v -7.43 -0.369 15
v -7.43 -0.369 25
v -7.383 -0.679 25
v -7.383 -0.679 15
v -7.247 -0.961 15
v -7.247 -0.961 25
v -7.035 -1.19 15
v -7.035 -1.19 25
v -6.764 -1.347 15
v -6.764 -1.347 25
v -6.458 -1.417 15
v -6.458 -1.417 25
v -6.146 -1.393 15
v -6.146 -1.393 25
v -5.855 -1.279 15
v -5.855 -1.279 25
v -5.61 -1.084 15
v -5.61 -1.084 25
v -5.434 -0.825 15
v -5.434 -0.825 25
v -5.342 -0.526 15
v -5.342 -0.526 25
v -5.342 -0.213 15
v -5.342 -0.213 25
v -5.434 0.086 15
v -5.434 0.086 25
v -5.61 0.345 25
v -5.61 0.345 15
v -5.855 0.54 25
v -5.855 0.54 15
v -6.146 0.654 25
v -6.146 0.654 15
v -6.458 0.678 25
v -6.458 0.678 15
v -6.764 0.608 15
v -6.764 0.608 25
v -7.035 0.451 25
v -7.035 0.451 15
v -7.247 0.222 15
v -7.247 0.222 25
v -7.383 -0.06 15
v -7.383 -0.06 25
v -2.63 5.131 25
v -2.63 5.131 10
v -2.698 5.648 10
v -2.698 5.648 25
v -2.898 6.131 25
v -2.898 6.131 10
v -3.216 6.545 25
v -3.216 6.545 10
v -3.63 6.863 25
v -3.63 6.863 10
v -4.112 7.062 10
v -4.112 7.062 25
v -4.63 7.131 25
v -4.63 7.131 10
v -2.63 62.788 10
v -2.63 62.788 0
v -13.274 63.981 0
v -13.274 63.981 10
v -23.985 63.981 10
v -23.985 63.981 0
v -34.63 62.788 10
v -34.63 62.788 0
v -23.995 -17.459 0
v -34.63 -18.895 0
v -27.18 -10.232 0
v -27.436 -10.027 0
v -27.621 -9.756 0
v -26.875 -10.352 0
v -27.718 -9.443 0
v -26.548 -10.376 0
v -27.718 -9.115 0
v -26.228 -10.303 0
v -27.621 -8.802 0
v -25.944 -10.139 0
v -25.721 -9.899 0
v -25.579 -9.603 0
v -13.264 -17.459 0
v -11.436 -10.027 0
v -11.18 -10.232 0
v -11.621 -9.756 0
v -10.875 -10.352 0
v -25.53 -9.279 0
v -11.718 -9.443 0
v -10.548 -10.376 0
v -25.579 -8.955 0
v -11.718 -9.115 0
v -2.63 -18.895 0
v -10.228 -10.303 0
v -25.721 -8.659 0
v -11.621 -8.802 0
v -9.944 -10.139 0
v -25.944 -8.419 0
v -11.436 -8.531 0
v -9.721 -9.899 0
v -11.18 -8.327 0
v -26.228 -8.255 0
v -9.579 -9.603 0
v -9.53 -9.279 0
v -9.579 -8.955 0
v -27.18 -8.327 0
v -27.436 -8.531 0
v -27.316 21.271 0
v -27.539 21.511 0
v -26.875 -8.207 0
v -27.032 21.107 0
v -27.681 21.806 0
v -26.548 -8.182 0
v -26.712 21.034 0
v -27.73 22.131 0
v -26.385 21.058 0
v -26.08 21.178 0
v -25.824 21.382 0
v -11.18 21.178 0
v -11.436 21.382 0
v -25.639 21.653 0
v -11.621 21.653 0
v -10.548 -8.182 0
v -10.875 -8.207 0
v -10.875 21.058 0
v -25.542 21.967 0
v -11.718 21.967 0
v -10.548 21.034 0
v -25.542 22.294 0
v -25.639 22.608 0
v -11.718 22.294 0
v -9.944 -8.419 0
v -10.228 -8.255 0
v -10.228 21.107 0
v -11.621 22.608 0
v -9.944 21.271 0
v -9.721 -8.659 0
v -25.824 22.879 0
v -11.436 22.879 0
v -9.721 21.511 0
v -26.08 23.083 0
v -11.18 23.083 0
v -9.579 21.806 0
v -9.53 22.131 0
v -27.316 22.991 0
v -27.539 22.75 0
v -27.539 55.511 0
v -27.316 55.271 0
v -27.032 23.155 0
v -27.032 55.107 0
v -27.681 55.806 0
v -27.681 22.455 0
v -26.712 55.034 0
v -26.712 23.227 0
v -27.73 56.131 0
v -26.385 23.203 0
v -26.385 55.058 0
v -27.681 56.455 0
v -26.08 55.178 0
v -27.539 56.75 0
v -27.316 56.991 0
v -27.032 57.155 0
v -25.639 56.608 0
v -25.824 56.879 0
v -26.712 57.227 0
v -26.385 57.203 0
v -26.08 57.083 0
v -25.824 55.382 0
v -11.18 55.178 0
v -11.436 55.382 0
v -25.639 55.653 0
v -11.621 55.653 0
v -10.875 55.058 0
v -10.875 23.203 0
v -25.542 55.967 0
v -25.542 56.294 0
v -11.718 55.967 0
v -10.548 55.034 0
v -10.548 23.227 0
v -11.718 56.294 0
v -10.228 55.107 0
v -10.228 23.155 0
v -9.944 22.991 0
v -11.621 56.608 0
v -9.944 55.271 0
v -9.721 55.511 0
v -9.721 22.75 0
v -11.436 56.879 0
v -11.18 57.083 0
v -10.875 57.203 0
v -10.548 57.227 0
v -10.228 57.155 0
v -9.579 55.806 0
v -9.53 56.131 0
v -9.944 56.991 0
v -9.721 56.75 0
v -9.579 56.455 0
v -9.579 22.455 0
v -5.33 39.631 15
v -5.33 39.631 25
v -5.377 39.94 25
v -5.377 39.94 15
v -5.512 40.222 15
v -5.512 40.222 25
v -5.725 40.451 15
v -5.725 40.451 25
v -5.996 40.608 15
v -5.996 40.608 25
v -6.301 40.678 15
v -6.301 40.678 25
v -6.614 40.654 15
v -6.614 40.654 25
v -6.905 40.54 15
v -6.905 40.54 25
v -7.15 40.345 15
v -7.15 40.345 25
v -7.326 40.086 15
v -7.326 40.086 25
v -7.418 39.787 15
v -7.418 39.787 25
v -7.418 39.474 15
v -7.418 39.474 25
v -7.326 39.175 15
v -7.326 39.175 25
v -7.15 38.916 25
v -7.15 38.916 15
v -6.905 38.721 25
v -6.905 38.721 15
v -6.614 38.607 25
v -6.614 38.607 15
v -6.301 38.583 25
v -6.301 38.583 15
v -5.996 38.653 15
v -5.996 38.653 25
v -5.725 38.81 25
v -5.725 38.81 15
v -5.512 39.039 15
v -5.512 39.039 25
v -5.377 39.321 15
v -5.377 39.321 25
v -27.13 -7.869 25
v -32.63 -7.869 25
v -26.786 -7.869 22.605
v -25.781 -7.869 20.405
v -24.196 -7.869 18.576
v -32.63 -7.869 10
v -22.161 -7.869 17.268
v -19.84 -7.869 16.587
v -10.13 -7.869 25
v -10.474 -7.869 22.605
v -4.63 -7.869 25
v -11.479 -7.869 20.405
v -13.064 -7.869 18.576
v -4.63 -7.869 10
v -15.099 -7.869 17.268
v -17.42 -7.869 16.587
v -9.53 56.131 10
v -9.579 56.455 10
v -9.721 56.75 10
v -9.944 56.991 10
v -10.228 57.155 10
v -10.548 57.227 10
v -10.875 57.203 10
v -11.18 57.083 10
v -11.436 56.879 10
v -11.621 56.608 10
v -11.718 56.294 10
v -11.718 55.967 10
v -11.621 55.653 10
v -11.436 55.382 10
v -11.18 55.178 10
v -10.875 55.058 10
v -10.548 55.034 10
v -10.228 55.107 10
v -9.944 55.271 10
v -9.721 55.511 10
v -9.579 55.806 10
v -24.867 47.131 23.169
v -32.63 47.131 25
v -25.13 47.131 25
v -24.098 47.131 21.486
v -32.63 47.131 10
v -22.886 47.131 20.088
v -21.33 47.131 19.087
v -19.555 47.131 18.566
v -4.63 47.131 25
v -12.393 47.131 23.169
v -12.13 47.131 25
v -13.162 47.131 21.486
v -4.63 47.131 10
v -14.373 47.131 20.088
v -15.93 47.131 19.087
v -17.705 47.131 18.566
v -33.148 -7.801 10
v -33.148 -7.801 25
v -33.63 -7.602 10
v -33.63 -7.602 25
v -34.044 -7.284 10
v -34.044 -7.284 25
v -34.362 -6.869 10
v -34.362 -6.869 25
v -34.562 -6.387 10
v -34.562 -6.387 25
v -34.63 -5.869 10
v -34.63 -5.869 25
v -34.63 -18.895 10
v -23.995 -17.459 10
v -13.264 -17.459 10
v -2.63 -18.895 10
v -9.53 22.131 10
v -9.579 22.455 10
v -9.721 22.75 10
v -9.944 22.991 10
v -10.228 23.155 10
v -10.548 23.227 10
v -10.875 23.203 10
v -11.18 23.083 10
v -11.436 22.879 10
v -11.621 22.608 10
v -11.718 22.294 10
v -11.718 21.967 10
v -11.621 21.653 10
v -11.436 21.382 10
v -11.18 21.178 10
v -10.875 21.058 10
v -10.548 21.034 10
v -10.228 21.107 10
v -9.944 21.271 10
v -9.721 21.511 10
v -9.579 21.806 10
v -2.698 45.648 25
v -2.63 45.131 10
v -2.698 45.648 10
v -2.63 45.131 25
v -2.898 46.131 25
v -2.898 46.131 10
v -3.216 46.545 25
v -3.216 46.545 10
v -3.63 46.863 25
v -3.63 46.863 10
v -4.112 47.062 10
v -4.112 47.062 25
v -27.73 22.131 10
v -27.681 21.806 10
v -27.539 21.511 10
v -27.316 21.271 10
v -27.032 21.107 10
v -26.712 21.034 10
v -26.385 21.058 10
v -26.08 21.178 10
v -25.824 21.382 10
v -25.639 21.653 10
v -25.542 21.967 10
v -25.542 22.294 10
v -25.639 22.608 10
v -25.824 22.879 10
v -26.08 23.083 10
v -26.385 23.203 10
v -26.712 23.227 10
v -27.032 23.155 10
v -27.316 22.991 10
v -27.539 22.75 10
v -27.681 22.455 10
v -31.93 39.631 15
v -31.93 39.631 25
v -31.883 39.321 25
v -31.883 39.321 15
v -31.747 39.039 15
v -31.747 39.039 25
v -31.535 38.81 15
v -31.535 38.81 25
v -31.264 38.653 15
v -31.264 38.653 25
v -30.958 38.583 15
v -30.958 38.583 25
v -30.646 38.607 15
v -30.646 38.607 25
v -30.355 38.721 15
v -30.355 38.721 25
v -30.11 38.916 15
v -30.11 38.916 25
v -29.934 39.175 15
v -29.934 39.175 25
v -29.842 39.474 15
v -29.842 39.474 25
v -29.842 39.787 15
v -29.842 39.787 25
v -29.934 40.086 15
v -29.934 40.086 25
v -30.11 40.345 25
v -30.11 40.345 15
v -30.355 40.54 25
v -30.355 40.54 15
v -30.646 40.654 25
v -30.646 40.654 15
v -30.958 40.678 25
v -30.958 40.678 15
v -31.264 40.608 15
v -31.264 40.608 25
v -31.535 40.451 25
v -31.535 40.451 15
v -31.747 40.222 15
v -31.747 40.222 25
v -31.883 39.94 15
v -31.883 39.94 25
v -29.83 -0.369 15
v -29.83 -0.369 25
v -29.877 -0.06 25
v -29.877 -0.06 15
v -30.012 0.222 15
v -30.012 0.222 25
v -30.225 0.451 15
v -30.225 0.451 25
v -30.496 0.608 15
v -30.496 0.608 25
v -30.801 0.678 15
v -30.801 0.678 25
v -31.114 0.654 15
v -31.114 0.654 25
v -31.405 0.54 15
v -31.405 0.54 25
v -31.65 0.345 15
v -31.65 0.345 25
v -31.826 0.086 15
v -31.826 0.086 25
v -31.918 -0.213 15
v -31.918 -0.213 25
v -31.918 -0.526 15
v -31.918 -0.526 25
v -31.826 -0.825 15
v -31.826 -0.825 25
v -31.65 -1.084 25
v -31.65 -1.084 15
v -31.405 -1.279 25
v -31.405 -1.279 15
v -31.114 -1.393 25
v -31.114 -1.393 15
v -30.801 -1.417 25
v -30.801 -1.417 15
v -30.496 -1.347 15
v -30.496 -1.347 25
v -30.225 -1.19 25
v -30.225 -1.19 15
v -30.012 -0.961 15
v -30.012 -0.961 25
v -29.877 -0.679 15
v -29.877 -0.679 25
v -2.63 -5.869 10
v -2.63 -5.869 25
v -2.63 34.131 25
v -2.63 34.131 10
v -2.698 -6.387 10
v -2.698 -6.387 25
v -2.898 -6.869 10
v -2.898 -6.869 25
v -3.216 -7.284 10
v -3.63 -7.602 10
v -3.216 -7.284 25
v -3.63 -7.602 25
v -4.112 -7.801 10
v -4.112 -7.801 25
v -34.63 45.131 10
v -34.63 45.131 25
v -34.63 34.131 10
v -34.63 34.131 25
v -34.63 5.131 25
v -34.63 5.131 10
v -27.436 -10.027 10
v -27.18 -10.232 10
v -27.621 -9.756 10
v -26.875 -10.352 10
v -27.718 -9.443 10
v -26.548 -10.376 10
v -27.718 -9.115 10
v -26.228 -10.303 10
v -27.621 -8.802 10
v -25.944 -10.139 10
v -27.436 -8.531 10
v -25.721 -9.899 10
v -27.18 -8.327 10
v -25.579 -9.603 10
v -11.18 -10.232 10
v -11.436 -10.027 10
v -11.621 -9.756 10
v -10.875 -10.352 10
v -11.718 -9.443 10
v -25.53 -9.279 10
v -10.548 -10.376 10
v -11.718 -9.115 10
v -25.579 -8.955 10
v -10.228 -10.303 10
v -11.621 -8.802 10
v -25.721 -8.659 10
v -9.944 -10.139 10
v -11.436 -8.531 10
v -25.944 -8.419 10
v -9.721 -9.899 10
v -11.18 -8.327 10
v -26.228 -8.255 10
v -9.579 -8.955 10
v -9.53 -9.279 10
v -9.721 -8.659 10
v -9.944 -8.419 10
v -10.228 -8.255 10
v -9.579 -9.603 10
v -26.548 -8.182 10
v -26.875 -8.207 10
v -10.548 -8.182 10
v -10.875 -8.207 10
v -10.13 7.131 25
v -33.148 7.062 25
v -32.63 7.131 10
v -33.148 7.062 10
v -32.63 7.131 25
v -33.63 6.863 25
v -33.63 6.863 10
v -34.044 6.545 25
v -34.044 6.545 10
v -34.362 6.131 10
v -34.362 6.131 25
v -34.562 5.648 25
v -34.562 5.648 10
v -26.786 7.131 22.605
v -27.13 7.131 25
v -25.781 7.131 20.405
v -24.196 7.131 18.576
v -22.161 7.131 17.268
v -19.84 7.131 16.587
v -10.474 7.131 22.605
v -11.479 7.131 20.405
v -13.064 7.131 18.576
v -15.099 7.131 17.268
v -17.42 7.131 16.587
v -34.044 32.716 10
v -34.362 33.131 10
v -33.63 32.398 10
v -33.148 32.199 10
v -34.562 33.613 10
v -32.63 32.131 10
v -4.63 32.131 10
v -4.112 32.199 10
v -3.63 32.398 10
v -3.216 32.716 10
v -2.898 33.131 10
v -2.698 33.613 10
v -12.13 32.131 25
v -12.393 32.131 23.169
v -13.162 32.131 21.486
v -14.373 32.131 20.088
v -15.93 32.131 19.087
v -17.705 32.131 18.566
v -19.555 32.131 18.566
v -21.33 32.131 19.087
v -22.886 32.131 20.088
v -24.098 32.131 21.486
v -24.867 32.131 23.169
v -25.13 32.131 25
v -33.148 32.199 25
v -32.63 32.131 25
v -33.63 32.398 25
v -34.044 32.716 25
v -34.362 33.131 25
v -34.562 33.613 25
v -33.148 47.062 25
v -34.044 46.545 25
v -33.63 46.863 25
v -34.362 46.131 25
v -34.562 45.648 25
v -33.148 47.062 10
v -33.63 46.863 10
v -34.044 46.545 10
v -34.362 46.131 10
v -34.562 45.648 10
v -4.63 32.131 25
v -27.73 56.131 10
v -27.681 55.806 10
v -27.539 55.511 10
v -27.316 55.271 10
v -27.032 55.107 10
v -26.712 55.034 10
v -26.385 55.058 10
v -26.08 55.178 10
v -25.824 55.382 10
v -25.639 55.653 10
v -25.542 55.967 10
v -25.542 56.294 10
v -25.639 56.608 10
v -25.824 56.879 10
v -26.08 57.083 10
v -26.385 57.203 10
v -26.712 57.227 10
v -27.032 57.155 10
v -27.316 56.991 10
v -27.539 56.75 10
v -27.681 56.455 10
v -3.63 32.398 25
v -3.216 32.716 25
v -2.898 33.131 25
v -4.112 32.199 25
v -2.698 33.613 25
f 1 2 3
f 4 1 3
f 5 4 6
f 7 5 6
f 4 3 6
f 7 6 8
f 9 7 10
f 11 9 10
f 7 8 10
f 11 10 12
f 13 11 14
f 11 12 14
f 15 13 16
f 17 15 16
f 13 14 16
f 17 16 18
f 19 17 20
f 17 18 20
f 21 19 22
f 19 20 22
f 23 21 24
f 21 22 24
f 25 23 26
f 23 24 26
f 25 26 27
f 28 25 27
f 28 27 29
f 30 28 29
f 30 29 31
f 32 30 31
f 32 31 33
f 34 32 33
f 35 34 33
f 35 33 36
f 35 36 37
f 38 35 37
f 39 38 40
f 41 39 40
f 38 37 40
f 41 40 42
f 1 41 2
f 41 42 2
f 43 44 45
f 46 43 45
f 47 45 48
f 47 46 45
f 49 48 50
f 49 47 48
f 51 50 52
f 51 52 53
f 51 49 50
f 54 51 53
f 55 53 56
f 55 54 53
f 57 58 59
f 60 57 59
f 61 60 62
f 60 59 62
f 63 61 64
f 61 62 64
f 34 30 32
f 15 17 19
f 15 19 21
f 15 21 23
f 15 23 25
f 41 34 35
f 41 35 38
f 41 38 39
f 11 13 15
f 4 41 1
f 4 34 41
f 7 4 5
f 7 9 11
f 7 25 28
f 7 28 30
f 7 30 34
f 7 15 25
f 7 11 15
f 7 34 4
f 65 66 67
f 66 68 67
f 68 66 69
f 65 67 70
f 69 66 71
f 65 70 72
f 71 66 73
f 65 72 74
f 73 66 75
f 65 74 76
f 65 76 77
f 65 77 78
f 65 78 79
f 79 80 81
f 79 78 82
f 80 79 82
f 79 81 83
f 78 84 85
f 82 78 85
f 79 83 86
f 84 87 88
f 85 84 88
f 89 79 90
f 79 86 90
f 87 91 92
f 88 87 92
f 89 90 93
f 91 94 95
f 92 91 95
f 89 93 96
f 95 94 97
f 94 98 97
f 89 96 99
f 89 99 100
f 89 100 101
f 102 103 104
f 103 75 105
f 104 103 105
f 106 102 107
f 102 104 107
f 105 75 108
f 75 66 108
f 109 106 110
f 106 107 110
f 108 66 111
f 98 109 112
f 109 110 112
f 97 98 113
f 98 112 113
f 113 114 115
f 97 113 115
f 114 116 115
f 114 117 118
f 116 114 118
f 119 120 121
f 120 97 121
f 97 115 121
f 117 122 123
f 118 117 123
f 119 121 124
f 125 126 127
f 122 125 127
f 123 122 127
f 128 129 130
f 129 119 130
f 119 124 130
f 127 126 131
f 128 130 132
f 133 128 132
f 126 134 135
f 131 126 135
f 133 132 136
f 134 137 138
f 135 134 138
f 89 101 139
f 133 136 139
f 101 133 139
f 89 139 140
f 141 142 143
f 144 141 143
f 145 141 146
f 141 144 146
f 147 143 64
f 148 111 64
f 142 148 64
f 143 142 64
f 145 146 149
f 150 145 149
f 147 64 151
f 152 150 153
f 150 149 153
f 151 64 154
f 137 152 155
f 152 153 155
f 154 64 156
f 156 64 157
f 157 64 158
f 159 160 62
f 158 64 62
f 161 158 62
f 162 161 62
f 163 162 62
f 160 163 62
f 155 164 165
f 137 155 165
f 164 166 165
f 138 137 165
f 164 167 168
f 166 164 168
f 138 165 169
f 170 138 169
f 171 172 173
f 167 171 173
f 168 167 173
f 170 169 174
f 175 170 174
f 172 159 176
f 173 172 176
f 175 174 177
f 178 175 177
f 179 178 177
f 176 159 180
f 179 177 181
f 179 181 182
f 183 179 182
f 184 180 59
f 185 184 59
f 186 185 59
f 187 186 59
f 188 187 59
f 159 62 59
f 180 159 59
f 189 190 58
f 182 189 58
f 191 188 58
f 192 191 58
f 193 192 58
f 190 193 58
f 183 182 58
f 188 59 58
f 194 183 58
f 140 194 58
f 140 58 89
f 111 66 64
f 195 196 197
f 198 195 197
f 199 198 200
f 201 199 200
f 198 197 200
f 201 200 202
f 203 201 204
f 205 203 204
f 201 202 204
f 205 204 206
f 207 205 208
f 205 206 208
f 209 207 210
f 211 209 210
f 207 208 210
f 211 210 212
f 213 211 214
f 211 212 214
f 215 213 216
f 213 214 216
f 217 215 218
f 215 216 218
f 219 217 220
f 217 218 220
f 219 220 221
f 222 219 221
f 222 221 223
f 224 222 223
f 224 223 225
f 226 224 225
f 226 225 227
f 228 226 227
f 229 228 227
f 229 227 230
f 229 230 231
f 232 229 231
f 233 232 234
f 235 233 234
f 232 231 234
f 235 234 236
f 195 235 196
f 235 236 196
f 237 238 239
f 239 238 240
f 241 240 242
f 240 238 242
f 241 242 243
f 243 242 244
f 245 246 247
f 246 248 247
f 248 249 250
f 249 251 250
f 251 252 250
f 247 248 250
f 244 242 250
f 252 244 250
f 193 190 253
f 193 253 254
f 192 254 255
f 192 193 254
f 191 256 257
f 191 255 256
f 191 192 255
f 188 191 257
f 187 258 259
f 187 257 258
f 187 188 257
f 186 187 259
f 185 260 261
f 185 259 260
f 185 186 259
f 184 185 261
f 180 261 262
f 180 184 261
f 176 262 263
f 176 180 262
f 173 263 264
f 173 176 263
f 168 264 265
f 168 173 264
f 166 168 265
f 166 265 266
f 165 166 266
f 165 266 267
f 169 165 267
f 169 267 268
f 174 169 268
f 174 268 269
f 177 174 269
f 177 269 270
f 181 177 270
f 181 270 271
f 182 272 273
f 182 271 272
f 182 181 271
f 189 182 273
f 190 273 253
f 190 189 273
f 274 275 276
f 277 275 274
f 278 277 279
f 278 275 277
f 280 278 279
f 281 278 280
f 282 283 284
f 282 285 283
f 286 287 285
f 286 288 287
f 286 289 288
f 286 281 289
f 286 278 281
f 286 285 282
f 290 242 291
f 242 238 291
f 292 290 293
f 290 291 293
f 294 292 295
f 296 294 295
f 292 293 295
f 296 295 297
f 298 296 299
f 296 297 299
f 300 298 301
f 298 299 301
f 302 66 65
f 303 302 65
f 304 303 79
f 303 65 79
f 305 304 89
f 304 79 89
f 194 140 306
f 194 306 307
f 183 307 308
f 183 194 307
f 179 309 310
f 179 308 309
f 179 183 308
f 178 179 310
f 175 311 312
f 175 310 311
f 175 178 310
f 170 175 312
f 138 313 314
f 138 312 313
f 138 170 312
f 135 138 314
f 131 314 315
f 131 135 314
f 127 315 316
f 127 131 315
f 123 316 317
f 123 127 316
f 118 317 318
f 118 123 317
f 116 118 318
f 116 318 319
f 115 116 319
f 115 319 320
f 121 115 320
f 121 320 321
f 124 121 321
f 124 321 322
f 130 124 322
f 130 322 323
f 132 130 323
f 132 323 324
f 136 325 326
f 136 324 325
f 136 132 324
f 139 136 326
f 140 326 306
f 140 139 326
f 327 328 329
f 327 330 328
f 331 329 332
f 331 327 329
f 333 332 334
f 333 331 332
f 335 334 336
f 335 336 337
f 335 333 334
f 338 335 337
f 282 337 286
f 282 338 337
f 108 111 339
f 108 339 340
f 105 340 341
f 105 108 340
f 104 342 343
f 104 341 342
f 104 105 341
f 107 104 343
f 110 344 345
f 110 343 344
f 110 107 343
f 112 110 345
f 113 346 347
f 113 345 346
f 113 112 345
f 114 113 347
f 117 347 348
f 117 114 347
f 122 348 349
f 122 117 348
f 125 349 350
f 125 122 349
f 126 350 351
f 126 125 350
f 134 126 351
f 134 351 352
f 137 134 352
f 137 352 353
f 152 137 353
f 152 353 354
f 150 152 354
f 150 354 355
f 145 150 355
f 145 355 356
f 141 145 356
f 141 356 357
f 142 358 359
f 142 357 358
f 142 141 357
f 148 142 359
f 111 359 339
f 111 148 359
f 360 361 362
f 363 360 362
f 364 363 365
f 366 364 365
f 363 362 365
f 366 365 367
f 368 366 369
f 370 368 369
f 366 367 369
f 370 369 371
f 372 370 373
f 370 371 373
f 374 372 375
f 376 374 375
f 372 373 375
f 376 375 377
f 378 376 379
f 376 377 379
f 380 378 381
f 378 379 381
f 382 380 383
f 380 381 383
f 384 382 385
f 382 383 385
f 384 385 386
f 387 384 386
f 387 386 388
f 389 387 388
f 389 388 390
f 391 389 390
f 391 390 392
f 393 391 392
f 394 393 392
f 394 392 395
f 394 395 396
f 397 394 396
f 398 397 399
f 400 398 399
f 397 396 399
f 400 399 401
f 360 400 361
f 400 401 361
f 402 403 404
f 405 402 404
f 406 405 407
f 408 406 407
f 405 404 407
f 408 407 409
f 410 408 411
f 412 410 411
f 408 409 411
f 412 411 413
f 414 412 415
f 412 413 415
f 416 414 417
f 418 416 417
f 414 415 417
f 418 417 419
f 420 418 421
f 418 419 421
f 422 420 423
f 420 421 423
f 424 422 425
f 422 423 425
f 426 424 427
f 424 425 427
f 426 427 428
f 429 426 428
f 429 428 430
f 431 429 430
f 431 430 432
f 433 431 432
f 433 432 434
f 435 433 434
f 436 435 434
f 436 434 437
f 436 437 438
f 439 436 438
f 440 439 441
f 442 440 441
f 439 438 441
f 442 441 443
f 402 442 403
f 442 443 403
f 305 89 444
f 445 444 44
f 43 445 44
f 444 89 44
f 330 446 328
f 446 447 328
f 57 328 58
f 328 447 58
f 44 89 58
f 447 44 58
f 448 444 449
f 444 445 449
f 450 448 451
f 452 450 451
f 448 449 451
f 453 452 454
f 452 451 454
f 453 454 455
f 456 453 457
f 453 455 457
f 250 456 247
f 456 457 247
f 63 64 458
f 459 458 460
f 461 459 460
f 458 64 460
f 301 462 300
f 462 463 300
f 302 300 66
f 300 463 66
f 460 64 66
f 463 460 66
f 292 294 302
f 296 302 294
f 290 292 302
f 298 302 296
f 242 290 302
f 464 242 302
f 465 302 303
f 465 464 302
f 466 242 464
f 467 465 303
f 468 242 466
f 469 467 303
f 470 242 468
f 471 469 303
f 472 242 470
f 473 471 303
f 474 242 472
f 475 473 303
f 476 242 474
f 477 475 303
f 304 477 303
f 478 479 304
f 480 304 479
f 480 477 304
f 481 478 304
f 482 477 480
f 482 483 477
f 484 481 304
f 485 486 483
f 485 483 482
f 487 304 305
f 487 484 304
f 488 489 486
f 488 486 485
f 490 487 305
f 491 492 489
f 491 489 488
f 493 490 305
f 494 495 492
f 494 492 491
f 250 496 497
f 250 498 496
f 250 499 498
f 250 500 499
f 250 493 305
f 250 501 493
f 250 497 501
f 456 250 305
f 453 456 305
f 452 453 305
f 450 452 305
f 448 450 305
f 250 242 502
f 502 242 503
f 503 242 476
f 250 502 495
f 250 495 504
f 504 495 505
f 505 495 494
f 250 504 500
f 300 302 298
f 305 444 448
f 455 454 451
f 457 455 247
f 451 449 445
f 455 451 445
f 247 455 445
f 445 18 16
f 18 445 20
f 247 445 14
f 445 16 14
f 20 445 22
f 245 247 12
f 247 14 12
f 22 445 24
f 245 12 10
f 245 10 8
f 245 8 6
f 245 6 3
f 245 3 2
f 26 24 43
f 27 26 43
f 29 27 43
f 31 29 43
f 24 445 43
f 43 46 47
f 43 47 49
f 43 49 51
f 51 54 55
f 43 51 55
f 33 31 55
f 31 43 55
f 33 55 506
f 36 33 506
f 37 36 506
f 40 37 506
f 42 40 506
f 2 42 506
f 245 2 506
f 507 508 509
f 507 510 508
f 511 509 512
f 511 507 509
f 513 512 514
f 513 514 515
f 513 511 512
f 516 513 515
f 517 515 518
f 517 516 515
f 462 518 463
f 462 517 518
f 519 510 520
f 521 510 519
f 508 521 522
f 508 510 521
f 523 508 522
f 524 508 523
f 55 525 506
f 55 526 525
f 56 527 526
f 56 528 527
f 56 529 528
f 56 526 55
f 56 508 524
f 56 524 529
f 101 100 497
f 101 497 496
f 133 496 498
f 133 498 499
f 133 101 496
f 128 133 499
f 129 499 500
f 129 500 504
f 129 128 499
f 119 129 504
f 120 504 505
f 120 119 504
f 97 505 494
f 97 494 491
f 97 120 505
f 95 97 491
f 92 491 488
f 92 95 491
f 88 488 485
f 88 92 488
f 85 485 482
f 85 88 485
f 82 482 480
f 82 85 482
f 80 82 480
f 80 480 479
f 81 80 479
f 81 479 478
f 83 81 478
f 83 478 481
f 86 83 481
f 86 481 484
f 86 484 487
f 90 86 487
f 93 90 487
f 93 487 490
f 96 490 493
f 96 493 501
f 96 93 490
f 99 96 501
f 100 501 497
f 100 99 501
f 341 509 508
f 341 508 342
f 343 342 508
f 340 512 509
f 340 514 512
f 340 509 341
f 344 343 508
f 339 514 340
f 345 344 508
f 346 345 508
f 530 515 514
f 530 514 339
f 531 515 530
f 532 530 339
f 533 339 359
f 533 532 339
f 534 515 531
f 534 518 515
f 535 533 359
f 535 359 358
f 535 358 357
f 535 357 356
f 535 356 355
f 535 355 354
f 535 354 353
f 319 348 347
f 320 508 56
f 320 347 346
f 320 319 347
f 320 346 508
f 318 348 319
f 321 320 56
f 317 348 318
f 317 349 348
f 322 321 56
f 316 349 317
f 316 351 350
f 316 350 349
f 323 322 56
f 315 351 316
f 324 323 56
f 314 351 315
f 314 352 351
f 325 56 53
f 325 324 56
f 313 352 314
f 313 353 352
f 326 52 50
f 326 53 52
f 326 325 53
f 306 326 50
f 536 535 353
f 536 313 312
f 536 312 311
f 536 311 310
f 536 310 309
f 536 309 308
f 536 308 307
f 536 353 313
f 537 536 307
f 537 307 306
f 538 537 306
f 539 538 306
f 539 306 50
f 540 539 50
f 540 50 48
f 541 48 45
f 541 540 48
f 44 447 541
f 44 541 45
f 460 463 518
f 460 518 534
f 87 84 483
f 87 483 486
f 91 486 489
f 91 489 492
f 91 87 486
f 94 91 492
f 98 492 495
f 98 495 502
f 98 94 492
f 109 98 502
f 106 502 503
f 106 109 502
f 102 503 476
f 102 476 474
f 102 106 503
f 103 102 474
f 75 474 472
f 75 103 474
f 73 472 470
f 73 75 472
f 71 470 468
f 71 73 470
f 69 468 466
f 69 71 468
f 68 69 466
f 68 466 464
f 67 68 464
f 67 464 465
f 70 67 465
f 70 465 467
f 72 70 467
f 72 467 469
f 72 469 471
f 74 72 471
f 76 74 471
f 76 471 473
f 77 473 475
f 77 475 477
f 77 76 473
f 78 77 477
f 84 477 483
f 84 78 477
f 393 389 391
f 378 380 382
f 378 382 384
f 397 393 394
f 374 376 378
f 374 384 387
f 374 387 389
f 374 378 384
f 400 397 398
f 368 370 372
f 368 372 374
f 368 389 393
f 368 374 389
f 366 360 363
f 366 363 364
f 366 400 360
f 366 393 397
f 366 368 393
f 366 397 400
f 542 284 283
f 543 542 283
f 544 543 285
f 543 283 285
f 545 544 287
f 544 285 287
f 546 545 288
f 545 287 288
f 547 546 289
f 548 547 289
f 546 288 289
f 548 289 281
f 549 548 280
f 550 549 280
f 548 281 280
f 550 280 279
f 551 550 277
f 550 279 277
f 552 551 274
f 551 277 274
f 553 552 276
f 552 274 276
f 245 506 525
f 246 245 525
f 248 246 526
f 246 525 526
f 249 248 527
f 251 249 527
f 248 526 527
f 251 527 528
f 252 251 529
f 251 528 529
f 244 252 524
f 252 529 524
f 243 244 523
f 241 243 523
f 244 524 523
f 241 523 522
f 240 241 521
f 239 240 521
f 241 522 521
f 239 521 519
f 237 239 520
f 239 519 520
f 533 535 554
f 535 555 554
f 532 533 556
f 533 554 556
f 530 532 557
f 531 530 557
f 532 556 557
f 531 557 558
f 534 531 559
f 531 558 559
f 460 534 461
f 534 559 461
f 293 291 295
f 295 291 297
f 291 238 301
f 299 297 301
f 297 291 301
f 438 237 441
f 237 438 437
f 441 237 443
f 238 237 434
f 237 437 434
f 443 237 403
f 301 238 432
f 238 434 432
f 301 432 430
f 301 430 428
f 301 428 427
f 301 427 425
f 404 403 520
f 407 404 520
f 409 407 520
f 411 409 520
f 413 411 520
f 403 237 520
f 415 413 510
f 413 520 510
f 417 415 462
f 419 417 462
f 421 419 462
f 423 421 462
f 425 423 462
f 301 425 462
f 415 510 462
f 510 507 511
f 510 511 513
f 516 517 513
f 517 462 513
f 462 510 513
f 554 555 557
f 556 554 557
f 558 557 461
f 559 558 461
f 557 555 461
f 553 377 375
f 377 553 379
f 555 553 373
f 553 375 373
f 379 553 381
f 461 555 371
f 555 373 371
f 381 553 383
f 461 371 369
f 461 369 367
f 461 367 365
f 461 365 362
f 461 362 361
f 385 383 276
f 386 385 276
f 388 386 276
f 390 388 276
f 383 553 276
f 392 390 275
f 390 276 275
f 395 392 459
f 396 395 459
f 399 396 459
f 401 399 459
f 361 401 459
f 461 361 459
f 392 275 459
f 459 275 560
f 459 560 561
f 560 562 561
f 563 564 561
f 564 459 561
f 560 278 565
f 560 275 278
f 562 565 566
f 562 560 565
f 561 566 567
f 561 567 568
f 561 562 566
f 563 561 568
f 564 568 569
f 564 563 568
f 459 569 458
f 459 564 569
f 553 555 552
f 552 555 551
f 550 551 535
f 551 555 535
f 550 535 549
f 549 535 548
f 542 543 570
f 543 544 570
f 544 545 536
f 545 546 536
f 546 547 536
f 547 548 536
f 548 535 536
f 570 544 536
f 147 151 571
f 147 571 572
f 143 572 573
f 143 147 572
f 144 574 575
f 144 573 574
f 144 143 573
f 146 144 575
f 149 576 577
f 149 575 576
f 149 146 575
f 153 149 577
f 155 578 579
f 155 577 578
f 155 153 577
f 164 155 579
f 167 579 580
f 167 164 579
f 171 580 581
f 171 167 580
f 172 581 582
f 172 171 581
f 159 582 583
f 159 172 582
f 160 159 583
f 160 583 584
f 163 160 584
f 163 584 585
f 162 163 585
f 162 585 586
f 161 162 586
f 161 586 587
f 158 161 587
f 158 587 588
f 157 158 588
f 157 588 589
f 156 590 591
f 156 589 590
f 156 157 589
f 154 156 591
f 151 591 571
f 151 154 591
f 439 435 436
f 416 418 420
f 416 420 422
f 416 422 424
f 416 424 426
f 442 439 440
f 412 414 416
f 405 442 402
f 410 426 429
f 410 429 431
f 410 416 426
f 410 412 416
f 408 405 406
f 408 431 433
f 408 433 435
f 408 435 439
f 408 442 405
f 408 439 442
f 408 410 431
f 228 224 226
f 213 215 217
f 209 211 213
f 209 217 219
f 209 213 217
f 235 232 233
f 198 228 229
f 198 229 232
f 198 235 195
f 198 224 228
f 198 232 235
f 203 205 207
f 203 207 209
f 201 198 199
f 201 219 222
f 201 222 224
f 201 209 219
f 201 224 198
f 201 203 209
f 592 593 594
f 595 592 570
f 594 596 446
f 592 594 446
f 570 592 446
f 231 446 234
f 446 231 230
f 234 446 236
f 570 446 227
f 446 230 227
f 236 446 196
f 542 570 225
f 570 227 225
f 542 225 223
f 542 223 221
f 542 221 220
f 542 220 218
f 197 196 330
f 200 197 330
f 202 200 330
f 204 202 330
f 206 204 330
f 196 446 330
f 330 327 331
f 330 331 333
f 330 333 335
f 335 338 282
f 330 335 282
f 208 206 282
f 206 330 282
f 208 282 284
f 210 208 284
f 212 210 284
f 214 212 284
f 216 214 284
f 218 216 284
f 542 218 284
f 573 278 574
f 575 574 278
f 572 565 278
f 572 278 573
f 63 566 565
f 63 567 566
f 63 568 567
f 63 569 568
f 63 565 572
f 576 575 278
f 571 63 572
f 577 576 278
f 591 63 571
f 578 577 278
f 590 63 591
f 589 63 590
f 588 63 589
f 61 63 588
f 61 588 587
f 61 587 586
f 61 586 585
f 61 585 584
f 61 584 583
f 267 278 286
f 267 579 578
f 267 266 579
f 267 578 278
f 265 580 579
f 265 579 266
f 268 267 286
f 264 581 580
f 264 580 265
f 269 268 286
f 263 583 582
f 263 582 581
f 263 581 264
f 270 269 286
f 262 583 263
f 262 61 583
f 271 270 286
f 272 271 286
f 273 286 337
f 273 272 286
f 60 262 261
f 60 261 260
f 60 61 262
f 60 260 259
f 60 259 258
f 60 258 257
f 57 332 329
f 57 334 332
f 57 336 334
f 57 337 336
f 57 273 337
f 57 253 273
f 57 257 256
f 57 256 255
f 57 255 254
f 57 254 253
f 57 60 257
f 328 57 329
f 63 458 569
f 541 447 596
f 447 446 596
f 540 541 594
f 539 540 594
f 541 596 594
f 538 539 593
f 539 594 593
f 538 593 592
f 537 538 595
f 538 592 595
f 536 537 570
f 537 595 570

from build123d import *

# Parameters (mm, degrees)
SKETCH1_R               = 1.1
BOSS_EXTRUDE7_DEPTH     = 10
CUT_EXTRUDE4_DEPTH      = 74.565999455
CUT_EXTRUDE4_DEPTH_BACK = 74.565999455
SKETCH1_9_R             = 1.1
SKETCH6_W               = 32
SKETCH6_H               = 15
BOSS_EXTRUDE8_DEPTH     = 30
CUT_EXTRUDE5_DEPTH      = 16
CUT_EXTRUDE6_DEPTH      = 22
SKETCH10_R              = 1.05
CUT_EXTRUDE7_DEPTH      = 10
FILLET1_R               = 2


with BuildPart() as part:
    # Sketch1 → Boss-Extrude7 (new body)
    with BuildSketch(Plane.XY):
        with BuildLine():
            Line((-2.62989834, -18.895475724), (-2.62989834, 62.787818526))
            ThreePointArc((-2.62989834, 62.787818526), (-18.62989834, 64.130541996), (-34.62989834, 62.787818526))
            Line((-34.62989834, 62.787818526), (-34.62989834, -18.895475724))
            ThreePointArc((-34.62989834, -18.895475724), (-18.62989834, -17.279147493), (-2.62989834, -18.895475724))
        make_face()
        with Locations((-26.62989834, -9.279147493)):
            Circle(SKETCH1_R, mode=Mode.SUBTRACT)
        with Locations((-10.62989834, -9.279147493)):
            Circle(SKETCH1_R, mode=Mode.SUBTRACT)
    extrude(amount=BOSS_EXTRUDE7_DEPTH)

    # Sketch1<9> → Cut-Extrude4 (cut, two sides: drawn at the far end of the back side and taken through both)
    with BuildSketch(Plane.XY.offset(-CUT_EXTRUDE4_DEPTH_BACK)):
        with Locations((-10.62989834, 56.130541996)):
            Circle(SKETCH1_9_R)
        with Locations((-26.62989834, 56.130541996)):
            Circle(SKETCH1_9_R)
        with Locations((-10.62989834, 22.130541996)):
            Circle(SKETCH1_9_R)
        with Locations((-26.62989834, 22.130541996)):
            Circle(SKETCH1_9_R)
    extrude(amount=CUT_EXTRUDE4_DEPTH + CUT_EXTRUDE4_DEPTH_BACK, mode=Mode.SUBTRACT)

    # Sketch6 → Boss-Extrude8 (add)
    with BuildSketch(Plane.XY.offset(10)):
        with Locations((-18.62989834, -0.369458004)):
            Rectangle(SKETCH6_W, SKETCH6_H)
        with Locations((-18.62989834, 39.630541996)):
            Rectangle(SKETCH6_W, SKETCH6_H)
    extrude(amount=BOSS_EXTRUDE8_DEPTH)

    # Sketch7 → Cut-Extrude5 (cut)
    with BuildSketch(Plane(origin=(0, 47.130541996, 0), x_dir=(1, 0, 0), z_dir=(0, 1, 0))):
        with BuildLine():
            Line((-2.62989834, -40), (-2.62989834, -25))
            Line((-2.62989834, -25), (-12.12989834, -25))
            ThreePointArc((-12.12989834, -25), (-18.62989834, -18.5), (-25.12989834, -25))
            Line((-25.12989834, -25), (-34.62989834, -25))
            Line((-34.62989834, -25), (-34.62989834, -40))
            Line((-34.62989834, -40), (-2.62989834, -40))
        make_face()
    extrude(amount=-CUT_EXTRUDE5_DEPTH, mode=Mode.SUBTRACT)

    # Sketch8 → Cut-Extrude6 (cut)
    with BuildSketch(Plane(origin=(0, 7.130541996, 0), x_dir=(1, 0, 0), z_dir=(0, 1, 0))):
        with BuildLine():
            Line((-2.62989834, -25), (-10.12989834, -25))
            ThreePointArc((-10.12989834, -25), (-18.62989834, -16.5), (-27.12989834, -25))
            Line((-27.12989834, -25), (-34.62989834, -25))
            Line((-34.62989834, -25), (-34.62989834, -40))
            Line((-34.62989834, -40), (-2.62989834, -40))
            Line((-2.62989834, -40), (-2.62989834, -25))
        make_face()
    extrude(amount=-CUT_EXTRUDE6_DEPTH, mode=Mode.SUBTRACT)

    # Sketch10 → Cut-Extrude7 (cut)
    with BuildSketch(Plane.XY.offset(25)):
        with Locations((-30.87989834, -0.369458004)):
            Circle(SKETCH10_R)
        with Locations((-30.87989834, 39.630541996)):
            Circle(SKETCH10_R)
        with Locations((-6.37989834, -0.369458004)):
            Circle(SKETCH10_R)
        with Locations((-6.37989834, 39.630541996)):
            Circle(SKETCH10_R)
    extrude(amount=-CUT_EXTRUDE7_DEPTH, mode=Mode.SUBTRACT)

    # Fillet1
    fillet1_edges = [part.edges().sort_by_distance(p)[0] for p in [
        (-34.62989834, 7.130541996, 17.5),
        (-2.62989834, 7.130541996, 17.5),
        (-34.62989834, 47.130541996, 17.5),
        (-2.62989834, 47.130541996, 17.5),
        (-34.62989834, 32.130541996, 17.5),
        (-2.62989834, 32.130541996, 17.5),
        (-2.62989834, -7.869458004, 17.5),
        (-34.62989834, -7.869458004, 17.5),
    ]]
    fillet(fillet1_edges, radius=FILLET1_R)


solid = part.part
